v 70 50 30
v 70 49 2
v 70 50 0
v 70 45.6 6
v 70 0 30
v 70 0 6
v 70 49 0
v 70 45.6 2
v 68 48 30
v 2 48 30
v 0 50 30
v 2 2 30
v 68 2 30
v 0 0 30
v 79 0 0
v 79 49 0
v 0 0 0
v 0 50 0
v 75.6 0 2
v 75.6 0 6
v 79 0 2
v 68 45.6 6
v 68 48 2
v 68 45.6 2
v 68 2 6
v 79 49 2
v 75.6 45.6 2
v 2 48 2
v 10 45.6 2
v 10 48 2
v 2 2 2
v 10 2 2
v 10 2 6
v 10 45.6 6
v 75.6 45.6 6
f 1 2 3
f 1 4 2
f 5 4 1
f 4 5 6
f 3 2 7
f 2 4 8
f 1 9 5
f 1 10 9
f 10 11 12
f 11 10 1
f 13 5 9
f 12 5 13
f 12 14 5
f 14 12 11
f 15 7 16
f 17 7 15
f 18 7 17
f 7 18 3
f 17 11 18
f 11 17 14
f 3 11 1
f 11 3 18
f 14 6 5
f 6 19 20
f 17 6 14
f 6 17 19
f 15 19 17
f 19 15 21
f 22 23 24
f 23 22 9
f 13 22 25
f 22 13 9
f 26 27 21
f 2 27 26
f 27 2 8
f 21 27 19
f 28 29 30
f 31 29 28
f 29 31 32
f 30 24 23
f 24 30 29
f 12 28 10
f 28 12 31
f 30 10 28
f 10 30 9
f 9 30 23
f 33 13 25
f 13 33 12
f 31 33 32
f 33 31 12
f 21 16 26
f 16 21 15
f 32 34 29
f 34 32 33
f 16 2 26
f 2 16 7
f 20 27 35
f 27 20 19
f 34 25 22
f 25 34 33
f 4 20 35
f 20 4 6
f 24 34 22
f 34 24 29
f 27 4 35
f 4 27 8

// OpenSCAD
// Two-part enclosure for small electronics board (e.g. Arduino-based logger)
// Print orientation: box on the bed (z = 0), lid on top (+Z)

// ---------------- Parameters ----------------
box_x      = 70;    // box outer length (X)
box_y      = 50;    // box outer width (Y)
box_z      = 30;    // box outer height (Z)
box_wall   = 2;     // box wall thickness (sides and top)
box_floor  = 2;     // box floor thickness

gap        = 10;    // gap between box and lid on the bed (X direction)

lip_h      = 4;     // lid lip height above plate
lip_t      = 1.5;   // lid lip thickness (wall)
lip_x      = 65.6;  // lid lip outer length (X)
lip_y      = 45.6;  // lid lip outer width (Y)

eps        = 0.5;   // cutter overshoot past faces

$fn = 64;

// ---------------- Derived ----------------
box_inner_x = box_x - 2 * box_wall;   // 66
box_inner_y = box_y - 2 * box_wall;   // 46
box_open_z  = box_z - box_floor;      // 28 (open top)

// ---------------- Model ----------------
union() {
    // Part 1: Box, open top
    difference() {
        cube([box_x, box_y, box_z]);
        translate([box_wall, box_wall, box_floor])
            cube([box_inner_x, box_inner_y, box_open_z + eps]);
    }

    // Part 2: Lid, printed upside down (plate on bed)
    translate([gap, 0, 0]) {
        union() {
            // Base plate
            cube([box_inner_x + 2 * lip_t, box_inner_y + 2 * lip_t, 2]);

            // Lip on top of plate
            translate([0, 0, 2])
                cube([lip_x, lip_y, lip_h]);
        }
    }
}
